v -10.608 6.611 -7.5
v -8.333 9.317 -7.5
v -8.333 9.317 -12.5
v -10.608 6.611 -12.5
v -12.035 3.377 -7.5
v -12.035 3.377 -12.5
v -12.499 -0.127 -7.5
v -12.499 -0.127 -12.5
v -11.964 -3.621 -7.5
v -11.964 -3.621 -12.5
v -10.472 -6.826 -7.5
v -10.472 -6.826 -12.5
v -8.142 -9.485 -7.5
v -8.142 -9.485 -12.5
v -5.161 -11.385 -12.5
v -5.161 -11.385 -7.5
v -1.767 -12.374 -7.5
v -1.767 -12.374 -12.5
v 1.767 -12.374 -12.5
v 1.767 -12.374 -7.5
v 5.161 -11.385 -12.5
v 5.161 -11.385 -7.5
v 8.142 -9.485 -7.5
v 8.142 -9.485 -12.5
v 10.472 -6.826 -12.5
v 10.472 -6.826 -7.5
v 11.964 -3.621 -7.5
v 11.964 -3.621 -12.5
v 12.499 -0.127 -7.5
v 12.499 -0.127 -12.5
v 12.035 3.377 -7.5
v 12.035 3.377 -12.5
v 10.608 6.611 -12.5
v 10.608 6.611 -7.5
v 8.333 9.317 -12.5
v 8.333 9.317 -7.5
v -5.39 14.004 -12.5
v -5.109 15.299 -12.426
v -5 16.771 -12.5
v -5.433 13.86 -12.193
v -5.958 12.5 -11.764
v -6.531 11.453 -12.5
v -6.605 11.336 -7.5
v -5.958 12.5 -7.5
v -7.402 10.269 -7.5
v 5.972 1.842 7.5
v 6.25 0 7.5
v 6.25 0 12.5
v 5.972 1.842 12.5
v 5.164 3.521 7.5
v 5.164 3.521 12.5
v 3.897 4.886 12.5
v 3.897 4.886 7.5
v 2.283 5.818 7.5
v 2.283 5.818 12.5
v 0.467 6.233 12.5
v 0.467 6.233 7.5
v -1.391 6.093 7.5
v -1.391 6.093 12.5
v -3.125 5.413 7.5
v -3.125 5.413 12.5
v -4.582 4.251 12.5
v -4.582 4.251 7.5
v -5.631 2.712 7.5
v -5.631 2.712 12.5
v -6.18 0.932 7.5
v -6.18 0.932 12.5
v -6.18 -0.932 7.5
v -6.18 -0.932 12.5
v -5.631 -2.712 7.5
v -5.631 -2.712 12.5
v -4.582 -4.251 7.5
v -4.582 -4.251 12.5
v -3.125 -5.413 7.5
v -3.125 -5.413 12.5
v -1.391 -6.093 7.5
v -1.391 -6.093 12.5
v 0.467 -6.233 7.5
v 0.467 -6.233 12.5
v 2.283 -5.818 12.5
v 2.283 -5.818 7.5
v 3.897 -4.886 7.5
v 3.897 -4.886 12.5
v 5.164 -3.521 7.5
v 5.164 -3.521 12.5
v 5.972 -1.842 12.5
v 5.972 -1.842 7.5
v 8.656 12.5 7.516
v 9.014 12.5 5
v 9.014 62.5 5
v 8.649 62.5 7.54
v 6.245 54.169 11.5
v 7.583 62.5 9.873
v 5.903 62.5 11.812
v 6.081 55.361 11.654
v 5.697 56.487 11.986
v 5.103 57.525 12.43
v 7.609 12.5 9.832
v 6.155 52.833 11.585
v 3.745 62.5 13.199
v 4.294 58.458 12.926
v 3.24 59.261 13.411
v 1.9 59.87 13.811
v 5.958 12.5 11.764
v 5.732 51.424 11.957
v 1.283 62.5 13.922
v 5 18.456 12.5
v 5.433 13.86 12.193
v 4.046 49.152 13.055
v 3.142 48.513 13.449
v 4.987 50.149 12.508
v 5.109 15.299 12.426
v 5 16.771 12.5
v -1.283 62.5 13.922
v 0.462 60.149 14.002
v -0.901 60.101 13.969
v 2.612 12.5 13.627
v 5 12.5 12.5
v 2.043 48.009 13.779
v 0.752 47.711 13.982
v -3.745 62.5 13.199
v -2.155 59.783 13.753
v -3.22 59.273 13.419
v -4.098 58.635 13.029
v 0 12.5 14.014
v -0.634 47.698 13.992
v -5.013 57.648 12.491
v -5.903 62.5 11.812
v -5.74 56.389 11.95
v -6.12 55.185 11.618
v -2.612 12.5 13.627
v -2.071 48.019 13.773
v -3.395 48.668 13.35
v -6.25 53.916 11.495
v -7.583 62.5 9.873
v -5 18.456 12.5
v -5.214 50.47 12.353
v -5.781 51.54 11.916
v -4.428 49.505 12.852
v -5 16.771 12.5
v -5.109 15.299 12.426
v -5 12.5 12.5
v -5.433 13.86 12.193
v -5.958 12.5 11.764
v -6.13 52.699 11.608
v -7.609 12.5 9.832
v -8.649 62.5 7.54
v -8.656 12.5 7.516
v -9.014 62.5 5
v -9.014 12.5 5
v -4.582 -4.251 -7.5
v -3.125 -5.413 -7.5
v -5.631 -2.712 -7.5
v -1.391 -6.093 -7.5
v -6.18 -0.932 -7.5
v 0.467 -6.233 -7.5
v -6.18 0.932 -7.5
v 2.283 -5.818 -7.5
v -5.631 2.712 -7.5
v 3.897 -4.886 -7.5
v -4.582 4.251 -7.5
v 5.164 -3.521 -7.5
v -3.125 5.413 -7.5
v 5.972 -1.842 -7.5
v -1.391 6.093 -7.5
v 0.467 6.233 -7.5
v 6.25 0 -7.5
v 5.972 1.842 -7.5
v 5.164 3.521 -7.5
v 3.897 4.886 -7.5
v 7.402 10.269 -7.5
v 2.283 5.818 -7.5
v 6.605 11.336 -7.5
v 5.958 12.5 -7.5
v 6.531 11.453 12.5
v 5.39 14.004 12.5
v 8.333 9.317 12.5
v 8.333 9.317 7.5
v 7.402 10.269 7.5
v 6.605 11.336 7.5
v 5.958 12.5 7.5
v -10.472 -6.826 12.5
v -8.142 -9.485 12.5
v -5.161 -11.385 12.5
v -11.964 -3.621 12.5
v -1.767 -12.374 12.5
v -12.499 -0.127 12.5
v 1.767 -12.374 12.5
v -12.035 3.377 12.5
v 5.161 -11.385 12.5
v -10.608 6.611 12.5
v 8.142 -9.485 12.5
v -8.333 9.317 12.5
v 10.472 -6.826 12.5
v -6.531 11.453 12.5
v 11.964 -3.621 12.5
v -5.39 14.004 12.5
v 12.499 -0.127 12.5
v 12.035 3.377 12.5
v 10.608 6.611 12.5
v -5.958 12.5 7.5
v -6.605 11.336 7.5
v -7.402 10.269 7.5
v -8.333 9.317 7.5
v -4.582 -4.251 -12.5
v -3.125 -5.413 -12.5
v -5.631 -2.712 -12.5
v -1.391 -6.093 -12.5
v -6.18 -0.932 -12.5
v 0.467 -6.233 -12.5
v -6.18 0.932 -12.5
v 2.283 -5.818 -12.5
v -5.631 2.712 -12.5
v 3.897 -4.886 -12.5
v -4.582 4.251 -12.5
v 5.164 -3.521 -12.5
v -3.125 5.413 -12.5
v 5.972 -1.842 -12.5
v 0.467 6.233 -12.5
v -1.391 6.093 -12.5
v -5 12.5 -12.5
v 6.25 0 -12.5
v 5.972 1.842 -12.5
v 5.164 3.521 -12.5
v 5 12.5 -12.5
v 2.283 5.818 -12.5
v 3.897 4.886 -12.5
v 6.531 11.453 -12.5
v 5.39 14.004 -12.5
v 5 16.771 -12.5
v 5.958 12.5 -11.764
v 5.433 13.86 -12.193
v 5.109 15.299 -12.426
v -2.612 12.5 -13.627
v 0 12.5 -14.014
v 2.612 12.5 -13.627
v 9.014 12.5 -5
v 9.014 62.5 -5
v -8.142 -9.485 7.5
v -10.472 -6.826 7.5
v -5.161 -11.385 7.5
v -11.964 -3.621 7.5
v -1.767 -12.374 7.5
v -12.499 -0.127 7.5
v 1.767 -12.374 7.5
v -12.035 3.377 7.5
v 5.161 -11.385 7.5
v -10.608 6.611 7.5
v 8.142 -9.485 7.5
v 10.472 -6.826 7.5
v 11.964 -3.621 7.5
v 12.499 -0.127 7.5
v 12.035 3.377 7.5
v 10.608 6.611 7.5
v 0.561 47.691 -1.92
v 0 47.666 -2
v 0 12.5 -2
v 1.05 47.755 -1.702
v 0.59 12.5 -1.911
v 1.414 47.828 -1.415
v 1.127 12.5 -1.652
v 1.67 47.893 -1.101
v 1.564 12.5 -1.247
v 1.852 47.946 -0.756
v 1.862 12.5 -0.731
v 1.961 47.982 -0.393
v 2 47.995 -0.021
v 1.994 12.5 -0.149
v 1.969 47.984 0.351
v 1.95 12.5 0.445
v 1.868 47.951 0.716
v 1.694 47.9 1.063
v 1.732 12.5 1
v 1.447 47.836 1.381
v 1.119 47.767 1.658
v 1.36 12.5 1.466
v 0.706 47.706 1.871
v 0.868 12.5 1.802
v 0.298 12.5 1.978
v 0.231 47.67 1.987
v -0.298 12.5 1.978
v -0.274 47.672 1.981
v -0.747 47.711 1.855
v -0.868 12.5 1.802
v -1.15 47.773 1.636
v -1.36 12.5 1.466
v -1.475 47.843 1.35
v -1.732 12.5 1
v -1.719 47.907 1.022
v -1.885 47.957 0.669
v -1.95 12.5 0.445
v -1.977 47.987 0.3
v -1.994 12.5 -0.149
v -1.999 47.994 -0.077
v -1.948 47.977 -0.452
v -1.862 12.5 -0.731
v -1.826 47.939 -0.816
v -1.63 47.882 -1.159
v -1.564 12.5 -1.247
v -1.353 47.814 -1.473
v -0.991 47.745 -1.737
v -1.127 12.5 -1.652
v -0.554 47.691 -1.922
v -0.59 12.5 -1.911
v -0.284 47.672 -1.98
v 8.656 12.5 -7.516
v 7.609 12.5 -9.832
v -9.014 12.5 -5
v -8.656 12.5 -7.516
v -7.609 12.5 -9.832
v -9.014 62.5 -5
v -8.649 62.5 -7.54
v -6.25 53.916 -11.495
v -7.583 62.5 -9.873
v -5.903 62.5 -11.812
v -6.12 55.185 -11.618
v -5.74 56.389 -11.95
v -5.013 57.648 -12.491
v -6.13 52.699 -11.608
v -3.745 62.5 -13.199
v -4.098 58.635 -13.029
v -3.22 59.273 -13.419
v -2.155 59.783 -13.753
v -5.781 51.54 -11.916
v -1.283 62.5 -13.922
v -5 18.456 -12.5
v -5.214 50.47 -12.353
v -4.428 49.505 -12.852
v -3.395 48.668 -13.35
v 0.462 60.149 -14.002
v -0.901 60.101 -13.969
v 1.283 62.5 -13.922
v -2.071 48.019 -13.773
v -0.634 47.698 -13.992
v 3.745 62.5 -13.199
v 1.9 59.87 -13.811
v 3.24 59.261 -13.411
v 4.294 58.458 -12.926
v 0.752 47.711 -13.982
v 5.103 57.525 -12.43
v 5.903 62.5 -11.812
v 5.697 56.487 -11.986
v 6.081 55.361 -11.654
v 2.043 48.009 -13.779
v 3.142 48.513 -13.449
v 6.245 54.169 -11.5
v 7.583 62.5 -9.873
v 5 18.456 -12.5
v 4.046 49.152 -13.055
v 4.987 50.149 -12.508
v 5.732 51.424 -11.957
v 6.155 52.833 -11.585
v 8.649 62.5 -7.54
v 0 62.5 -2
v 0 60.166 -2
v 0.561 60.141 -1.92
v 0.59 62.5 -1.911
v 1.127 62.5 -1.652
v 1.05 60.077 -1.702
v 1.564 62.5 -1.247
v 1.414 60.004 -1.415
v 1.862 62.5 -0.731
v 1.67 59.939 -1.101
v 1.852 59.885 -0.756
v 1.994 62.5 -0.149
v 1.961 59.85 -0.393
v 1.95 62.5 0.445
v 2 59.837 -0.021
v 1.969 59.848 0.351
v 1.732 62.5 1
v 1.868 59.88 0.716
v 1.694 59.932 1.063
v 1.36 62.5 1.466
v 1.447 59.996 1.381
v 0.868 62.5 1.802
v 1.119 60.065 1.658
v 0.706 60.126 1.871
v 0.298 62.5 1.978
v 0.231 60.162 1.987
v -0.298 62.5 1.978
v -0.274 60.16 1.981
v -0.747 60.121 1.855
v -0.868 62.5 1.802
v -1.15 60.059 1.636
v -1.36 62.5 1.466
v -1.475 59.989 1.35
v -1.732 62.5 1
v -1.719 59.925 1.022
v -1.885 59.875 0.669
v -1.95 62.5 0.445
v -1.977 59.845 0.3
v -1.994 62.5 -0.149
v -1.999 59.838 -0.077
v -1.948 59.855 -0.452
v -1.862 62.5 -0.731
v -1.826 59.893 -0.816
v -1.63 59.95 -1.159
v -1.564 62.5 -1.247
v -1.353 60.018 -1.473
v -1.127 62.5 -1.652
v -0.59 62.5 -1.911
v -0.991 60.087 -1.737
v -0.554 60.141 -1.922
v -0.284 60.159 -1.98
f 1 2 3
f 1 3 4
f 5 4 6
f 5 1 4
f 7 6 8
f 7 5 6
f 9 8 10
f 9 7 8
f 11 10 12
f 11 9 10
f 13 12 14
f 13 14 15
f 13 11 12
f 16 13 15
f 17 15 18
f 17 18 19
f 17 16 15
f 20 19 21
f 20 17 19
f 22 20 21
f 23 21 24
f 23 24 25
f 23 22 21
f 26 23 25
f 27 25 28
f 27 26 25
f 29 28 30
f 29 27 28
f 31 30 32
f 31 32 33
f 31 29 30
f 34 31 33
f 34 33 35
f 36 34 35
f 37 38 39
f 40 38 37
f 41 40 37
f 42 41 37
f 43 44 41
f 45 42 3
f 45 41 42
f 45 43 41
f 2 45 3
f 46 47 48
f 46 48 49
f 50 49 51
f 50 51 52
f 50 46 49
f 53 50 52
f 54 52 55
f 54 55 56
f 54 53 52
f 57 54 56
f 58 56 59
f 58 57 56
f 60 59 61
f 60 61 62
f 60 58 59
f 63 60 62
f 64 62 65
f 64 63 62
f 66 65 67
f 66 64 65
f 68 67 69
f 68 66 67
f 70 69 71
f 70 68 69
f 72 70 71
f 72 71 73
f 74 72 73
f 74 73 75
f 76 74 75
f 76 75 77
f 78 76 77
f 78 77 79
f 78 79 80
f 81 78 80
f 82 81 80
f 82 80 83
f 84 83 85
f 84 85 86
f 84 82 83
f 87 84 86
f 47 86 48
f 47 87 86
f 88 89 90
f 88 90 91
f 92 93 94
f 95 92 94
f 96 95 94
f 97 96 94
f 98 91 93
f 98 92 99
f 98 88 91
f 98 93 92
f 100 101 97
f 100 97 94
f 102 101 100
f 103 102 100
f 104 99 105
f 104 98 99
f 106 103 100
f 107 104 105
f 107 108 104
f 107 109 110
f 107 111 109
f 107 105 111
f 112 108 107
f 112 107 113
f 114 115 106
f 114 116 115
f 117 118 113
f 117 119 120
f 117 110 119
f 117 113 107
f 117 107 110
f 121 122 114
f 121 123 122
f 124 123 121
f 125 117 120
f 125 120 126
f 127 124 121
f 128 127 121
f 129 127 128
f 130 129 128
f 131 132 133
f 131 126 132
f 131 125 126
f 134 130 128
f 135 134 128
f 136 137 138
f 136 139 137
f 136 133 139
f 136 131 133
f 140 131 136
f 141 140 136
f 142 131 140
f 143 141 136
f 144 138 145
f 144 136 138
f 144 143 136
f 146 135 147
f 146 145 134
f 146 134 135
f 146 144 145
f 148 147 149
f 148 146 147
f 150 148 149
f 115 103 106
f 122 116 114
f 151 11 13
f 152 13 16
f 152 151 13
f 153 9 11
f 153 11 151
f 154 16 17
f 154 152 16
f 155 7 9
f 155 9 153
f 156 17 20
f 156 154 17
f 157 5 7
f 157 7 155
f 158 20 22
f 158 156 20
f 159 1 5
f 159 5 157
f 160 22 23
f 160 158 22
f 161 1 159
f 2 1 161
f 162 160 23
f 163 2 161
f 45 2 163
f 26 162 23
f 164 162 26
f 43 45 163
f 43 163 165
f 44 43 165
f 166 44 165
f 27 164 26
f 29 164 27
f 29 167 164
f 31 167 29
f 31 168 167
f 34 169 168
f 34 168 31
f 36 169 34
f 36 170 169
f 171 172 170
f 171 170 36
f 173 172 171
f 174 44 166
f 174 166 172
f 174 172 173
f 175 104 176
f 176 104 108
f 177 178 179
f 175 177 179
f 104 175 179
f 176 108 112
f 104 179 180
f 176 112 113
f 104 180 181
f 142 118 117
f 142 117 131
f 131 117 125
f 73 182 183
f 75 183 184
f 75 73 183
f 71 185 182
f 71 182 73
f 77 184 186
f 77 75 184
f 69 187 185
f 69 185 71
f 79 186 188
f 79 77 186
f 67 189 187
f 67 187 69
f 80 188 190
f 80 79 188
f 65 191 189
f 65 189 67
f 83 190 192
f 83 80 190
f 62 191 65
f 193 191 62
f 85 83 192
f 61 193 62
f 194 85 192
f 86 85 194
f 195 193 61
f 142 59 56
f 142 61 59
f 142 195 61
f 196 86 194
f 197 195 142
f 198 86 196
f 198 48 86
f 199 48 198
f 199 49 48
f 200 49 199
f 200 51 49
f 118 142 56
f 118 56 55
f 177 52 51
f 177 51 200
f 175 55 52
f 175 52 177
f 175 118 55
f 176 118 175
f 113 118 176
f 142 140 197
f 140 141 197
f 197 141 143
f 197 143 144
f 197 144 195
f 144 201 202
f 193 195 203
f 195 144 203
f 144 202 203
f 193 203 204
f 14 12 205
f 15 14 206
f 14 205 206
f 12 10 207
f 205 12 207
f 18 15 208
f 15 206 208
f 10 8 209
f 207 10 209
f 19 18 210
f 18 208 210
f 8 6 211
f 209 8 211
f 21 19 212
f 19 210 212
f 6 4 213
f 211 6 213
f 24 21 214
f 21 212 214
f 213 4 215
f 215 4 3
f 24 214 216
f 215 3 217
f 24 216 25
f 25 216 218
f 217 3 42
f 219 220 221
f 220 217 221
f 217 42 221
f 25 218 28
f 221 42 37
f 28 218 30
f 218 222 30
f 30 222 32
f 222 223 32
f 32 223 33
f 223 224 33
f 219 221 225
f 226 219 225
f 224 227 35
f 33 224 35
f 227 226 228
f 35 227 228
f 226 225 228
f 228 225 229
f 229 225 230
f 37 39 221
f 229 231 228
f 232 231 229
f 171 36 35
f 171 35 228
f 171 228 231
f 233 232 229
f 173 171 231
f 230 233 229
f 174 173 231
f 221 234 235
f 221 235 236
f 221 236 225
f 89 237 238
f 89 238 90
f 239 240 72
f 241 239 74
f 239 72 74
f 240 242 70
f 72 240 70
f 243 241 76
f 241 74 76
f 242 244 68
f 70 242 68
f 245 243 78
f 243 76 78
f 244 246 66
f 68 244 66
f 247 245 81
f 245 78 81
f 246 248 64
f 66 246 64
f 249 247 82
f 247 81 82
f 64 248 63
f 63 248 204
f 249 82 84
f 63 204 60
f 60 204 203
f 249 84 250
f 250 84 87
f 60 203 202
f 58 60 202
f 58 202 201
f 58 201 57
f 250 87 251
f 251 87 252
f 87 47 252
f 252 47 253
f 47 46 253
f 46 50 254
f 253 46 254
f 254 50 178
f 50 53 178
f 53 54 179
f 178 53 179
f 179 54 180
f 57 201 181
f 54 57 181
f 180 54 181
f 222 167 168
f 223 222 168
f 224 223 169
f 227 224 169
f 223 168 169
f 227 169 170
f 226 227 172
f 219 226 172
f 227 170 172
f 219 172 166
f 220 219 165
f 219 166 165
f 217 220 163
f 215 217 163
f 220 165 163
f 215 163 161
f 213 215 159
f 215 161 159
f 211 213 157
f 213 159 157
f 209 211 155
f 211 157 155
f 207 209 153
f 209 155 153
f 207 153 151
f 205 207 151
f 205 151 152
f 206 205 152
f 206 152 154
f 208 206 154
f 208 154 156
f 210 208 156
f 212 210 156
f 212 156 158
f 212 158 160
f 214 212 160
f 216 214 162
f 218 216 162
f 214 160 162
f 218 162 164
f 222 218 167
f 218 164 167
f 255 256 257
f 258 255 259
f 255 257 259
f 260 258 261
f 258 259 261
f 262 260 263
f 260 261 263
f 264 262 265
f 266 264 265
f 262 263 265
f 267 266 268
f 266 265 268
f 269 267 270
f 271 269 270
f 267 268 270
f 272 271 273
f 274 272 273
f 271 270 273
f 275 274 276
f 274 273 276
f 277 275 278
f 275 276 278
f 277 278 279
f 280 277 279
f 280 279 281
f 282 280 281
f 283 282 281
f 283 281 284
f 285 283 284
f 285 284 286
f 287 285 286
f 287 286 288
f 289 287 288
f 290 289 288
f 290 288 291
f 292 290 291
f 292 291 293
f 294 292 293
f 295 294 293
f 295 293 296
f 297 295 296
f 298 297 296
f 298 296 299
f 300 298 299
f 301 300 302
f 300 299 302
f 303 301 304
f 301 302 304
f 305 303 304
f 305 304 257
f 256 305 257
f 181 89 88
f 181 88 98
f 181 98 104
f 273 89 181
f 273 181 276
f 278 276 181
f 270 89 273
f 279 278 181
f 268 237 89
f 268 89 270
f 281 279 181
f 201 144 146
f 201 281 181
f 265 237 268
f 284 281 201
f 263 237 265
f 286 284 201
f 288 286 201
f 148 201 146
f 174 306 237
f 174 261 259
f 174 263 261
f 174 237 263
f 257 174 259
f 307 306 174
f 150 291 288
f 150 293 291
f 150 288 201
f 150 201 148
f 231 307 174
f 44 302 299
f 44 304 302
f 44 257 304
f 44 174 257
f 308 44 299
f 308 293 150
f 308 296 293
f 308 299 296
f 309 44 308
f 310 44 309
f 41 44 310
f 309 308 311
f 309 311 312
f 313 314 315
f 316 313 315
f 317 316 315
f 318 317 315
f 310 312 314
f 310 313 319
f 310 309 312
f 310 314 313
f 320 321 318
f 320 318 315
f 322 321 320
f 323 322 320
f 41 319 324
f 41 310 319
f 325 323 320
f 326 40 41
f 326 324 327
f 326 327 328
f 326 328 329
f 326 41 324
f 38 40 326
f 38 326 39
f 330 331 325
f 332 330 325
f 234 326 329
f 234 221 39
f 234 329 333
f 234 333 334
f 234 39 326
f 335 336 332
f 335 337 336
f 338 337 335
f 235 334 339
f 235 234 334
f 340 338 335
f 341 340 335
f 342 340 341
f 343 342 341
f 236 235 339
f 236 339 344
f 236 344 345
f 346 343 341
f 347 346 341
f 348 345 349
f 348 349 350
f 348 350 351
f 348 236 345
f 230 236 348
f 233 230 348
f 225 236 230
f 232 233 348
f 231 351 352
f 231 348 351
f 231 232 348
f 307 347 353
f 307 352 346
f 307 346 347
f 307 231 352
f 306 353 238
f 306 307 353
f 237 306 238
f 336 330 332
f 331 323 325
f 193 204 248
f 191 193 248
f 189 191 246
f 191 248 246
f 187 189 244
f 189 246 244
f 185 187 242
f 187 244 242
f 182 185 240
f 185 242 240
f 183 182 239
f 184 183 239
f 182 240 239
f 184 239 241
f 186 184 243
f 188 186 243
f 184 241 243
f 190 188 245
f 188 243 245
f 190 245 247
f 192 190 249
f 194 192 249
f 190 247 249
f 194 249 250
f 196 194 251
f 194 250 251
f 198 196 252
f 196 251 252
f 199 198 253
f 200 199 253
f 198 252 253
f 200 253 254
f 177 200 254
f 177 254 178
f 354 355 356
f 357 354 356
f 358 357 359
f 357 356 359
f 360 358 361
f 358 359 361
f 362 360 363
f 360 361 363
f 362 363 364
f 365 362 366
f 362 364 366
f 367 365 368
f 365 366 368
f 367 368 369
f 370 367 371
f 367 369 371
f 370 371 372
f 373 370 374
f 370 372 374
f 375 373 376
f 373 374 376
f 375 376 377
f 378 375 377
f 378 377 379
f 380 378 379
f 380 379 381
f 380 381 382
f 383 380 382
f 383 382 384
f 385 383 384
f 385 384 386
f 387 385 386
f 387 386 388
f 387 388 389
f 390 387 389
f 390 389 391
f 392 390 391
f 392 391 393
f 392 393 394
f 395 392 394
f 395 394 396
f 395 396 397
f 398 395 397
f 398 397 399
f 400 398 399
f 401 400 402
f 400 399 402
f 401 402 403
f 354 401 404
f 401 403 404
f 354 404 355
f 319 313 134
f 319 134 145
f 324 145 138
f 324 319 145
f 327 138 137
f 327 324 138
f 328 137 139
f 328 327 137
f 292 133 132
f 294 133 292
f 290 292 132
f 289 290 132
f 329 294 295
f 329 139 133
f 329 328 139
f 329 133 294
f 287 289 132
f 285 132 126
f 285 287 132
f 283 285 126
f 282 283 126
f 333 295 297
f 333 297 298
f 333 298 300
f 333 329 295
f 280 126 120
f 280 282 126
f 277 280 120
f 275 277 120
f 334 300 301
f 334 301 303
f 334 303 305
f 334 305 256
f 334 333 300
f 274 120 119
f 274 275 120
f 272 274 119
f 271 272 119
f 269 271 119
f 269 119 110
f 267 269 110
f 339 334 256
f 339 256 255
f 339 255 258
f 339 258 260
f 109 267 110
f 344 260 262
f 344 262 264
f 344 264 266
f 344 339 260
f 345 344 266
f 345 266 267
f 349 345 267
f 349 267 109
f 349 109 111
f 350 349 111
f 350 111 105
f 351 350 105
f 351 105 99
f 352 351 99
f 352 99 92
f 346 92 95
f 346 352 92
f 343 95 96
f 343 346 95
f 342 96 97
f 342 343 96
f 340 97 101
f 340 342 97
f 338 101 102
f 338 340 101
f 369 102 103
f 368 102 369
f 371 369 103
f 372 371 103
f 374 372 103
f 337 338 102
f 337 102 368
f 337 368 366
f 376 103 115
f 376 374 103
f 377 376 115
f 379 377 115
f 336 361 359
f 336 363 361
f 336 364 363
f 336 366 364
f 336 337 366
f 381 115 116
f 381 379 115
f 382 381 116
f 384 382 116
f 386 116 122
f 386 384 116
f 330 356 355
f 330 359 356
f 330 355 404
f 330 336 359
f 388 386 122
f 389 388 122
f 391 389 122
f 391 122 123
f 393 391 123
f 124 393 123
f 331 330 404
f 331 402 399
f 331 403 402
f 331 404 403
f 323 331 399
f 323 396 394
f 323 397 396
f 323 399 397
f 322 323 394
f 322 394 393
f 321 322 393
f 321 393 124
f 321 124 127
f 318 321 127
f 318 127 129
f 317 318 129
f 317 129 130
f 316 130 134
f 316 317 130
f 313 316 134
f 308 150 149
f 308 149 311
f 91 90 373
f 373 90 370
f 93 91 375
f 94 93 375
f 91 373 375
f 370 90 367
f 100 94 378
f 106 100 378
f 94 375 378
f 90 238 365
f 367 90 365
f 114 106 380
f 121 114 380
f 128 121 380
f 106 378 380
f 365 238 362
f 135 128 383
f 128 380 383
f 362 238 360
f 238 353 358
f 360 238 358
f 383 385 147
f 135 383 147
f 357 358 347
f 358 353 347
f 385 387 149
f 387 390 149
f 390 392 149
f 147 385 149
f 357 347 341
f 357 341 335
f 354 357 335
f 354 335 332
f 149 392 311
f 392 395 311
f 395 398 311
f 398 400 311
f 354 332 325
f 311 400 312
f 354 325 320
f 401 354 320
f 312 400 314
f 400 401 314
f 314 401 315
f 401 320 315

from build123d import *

# Parameters (mm, degrees)
BOSS_EXTRUDE1_START     = 7.5
SKETCH1_R               = 6.25
BOSS_EXTRUDE1_DEPTH     = 5
BOSS_EXTRUDE2_START     = -7.5
SKETCH1_2_R             = 6.25
BOSS_EXTRUDE2_DEPTH     = 5
BOSS_EXTRUDE3_START     = 12.5
BOSS_EXTRUDE3_DEPTH     = 50
SKETCH3_R               = 2
CUT_EXTRUDE1_DEPTH      = 56
CUT_EXTRUDE2_DEPTH      = 47
CUT_EXTRUDE2_DEPTH_BACK = 29
SKETCH4_R               = 6.25


with BuildPart() as part:
    # Sketch1 → Boss-Extrude1 (new body)
    with BuildSketch(Plane.XY.offset(BOSS_EXTRUDE1_START)):
        with BuildLine():
            Line((5, 16.770509831), (5, 18.456439237))
            Line((5, 18.456439237), (-5, 18.456439237))
            Line((-5, 18.456439237), (-5, 16.770509831))
            ThreePointArc((-5, 16.770509831), (-5.871290708, 12.688026927), (-8.333333333, 9.316949906))
            ThreePointArc((-8.333333333, 9.316949906), (0, -12.5), (8.333333333, 9.316949906))
            ThreePointArc((8.333333333, 9.316949906), (5.871290708, 12.688026927), (5, 16.770509831))
        make_face()
        Circle(SKETCH1_R, mode=Mode.SUBTRACT)
    extrude(amount=BOSS_EXTRUDE1_DEPTH)



with BuildPart() as body_2:
    # Sketch1<2> → Boss-Extrude2 (new body)
    with BuildSketch(Plane.XY.offset(BOSS_EXTRUDE2_START)):
        with BuildLine():
            Line((5, 16.770509831), (5, 18.456439237))
            Line((5, 18.456439237), (-5, 18.456439237))
            Line((-5, 18.456439237), (-5, 16.770509831))
            ThreePointArc((-5, 16.770509831), (-5.871290708, 12.688026927), (-8.333333333, 9.316949906))
            ThreePointArc((-8.333333333, 9.316949906), (0, -12.5), (8.333333333, 9.316949906))
            ThreePointArc((8.333333333, 9.316949906), (5.871290708, 12.688026927), (5, 16.770509831))
        make_face()
        Circle(SKETCH1_2_R, mode=Mode.SUBTRACT)
    extrude(amount=-BOSS_EXTRUDE2_DEPTH)


with BuildPart() as part_1:
    add(part.part)

    add(body_2.part)  # Boss-Extrude3 merges body 2
    # Sketch2 → Boss-Extrude3 (add)
    with BuildSketch(Plane(origin=(0, 0, 0), x_dir=(1, 0, 0), z_dir=(0, 1, 0)).offset(BOSS_EXTRUDE3_START)):
        with BuildLine():
            Line((9.013878189, 5), (9.013878189, -5))
            ThreePointArc((9.013878189, -5), (0, -14.013878189), (-9.013878189, -5))
            Line((-9.013878189, -5), (-9.013878189, 5))
            ThreePointArc((-9.013878189, 5), (0, 14.013878189), (9.013878189, 5))
        make_face()
    extrude(amount=BOSS_EXTRUDE3_DEPTH)

    # Sketch3 → Cut-Extrude1 (cut)
    with BuildSketch(Plane.XZ.offset(-12.5)):
        Circle(SKETCH3_R)
    extrude(amount=-CUT_EXTRUDE1_DEPTH, mode=Mode.SUBTRACT)

    # Sketch4 → Cut-Extrude2 (cut, two sides: drawn at the far end of the back side and taken through both)
    with BuildSketch(Plane.XY.offset(-CUT_EXTRUDE2_DEPTH_BACK)):
        with Locations((0, 53.915919761)):
            Circle(SKETCH4_R)
    extrude(amount=CUT_EXTRUDE2_DEPTH + CUT_EXTRUDE2_DEPTH_BACK, mode=Mode.SUBTRACT)


solid = part_1.part
